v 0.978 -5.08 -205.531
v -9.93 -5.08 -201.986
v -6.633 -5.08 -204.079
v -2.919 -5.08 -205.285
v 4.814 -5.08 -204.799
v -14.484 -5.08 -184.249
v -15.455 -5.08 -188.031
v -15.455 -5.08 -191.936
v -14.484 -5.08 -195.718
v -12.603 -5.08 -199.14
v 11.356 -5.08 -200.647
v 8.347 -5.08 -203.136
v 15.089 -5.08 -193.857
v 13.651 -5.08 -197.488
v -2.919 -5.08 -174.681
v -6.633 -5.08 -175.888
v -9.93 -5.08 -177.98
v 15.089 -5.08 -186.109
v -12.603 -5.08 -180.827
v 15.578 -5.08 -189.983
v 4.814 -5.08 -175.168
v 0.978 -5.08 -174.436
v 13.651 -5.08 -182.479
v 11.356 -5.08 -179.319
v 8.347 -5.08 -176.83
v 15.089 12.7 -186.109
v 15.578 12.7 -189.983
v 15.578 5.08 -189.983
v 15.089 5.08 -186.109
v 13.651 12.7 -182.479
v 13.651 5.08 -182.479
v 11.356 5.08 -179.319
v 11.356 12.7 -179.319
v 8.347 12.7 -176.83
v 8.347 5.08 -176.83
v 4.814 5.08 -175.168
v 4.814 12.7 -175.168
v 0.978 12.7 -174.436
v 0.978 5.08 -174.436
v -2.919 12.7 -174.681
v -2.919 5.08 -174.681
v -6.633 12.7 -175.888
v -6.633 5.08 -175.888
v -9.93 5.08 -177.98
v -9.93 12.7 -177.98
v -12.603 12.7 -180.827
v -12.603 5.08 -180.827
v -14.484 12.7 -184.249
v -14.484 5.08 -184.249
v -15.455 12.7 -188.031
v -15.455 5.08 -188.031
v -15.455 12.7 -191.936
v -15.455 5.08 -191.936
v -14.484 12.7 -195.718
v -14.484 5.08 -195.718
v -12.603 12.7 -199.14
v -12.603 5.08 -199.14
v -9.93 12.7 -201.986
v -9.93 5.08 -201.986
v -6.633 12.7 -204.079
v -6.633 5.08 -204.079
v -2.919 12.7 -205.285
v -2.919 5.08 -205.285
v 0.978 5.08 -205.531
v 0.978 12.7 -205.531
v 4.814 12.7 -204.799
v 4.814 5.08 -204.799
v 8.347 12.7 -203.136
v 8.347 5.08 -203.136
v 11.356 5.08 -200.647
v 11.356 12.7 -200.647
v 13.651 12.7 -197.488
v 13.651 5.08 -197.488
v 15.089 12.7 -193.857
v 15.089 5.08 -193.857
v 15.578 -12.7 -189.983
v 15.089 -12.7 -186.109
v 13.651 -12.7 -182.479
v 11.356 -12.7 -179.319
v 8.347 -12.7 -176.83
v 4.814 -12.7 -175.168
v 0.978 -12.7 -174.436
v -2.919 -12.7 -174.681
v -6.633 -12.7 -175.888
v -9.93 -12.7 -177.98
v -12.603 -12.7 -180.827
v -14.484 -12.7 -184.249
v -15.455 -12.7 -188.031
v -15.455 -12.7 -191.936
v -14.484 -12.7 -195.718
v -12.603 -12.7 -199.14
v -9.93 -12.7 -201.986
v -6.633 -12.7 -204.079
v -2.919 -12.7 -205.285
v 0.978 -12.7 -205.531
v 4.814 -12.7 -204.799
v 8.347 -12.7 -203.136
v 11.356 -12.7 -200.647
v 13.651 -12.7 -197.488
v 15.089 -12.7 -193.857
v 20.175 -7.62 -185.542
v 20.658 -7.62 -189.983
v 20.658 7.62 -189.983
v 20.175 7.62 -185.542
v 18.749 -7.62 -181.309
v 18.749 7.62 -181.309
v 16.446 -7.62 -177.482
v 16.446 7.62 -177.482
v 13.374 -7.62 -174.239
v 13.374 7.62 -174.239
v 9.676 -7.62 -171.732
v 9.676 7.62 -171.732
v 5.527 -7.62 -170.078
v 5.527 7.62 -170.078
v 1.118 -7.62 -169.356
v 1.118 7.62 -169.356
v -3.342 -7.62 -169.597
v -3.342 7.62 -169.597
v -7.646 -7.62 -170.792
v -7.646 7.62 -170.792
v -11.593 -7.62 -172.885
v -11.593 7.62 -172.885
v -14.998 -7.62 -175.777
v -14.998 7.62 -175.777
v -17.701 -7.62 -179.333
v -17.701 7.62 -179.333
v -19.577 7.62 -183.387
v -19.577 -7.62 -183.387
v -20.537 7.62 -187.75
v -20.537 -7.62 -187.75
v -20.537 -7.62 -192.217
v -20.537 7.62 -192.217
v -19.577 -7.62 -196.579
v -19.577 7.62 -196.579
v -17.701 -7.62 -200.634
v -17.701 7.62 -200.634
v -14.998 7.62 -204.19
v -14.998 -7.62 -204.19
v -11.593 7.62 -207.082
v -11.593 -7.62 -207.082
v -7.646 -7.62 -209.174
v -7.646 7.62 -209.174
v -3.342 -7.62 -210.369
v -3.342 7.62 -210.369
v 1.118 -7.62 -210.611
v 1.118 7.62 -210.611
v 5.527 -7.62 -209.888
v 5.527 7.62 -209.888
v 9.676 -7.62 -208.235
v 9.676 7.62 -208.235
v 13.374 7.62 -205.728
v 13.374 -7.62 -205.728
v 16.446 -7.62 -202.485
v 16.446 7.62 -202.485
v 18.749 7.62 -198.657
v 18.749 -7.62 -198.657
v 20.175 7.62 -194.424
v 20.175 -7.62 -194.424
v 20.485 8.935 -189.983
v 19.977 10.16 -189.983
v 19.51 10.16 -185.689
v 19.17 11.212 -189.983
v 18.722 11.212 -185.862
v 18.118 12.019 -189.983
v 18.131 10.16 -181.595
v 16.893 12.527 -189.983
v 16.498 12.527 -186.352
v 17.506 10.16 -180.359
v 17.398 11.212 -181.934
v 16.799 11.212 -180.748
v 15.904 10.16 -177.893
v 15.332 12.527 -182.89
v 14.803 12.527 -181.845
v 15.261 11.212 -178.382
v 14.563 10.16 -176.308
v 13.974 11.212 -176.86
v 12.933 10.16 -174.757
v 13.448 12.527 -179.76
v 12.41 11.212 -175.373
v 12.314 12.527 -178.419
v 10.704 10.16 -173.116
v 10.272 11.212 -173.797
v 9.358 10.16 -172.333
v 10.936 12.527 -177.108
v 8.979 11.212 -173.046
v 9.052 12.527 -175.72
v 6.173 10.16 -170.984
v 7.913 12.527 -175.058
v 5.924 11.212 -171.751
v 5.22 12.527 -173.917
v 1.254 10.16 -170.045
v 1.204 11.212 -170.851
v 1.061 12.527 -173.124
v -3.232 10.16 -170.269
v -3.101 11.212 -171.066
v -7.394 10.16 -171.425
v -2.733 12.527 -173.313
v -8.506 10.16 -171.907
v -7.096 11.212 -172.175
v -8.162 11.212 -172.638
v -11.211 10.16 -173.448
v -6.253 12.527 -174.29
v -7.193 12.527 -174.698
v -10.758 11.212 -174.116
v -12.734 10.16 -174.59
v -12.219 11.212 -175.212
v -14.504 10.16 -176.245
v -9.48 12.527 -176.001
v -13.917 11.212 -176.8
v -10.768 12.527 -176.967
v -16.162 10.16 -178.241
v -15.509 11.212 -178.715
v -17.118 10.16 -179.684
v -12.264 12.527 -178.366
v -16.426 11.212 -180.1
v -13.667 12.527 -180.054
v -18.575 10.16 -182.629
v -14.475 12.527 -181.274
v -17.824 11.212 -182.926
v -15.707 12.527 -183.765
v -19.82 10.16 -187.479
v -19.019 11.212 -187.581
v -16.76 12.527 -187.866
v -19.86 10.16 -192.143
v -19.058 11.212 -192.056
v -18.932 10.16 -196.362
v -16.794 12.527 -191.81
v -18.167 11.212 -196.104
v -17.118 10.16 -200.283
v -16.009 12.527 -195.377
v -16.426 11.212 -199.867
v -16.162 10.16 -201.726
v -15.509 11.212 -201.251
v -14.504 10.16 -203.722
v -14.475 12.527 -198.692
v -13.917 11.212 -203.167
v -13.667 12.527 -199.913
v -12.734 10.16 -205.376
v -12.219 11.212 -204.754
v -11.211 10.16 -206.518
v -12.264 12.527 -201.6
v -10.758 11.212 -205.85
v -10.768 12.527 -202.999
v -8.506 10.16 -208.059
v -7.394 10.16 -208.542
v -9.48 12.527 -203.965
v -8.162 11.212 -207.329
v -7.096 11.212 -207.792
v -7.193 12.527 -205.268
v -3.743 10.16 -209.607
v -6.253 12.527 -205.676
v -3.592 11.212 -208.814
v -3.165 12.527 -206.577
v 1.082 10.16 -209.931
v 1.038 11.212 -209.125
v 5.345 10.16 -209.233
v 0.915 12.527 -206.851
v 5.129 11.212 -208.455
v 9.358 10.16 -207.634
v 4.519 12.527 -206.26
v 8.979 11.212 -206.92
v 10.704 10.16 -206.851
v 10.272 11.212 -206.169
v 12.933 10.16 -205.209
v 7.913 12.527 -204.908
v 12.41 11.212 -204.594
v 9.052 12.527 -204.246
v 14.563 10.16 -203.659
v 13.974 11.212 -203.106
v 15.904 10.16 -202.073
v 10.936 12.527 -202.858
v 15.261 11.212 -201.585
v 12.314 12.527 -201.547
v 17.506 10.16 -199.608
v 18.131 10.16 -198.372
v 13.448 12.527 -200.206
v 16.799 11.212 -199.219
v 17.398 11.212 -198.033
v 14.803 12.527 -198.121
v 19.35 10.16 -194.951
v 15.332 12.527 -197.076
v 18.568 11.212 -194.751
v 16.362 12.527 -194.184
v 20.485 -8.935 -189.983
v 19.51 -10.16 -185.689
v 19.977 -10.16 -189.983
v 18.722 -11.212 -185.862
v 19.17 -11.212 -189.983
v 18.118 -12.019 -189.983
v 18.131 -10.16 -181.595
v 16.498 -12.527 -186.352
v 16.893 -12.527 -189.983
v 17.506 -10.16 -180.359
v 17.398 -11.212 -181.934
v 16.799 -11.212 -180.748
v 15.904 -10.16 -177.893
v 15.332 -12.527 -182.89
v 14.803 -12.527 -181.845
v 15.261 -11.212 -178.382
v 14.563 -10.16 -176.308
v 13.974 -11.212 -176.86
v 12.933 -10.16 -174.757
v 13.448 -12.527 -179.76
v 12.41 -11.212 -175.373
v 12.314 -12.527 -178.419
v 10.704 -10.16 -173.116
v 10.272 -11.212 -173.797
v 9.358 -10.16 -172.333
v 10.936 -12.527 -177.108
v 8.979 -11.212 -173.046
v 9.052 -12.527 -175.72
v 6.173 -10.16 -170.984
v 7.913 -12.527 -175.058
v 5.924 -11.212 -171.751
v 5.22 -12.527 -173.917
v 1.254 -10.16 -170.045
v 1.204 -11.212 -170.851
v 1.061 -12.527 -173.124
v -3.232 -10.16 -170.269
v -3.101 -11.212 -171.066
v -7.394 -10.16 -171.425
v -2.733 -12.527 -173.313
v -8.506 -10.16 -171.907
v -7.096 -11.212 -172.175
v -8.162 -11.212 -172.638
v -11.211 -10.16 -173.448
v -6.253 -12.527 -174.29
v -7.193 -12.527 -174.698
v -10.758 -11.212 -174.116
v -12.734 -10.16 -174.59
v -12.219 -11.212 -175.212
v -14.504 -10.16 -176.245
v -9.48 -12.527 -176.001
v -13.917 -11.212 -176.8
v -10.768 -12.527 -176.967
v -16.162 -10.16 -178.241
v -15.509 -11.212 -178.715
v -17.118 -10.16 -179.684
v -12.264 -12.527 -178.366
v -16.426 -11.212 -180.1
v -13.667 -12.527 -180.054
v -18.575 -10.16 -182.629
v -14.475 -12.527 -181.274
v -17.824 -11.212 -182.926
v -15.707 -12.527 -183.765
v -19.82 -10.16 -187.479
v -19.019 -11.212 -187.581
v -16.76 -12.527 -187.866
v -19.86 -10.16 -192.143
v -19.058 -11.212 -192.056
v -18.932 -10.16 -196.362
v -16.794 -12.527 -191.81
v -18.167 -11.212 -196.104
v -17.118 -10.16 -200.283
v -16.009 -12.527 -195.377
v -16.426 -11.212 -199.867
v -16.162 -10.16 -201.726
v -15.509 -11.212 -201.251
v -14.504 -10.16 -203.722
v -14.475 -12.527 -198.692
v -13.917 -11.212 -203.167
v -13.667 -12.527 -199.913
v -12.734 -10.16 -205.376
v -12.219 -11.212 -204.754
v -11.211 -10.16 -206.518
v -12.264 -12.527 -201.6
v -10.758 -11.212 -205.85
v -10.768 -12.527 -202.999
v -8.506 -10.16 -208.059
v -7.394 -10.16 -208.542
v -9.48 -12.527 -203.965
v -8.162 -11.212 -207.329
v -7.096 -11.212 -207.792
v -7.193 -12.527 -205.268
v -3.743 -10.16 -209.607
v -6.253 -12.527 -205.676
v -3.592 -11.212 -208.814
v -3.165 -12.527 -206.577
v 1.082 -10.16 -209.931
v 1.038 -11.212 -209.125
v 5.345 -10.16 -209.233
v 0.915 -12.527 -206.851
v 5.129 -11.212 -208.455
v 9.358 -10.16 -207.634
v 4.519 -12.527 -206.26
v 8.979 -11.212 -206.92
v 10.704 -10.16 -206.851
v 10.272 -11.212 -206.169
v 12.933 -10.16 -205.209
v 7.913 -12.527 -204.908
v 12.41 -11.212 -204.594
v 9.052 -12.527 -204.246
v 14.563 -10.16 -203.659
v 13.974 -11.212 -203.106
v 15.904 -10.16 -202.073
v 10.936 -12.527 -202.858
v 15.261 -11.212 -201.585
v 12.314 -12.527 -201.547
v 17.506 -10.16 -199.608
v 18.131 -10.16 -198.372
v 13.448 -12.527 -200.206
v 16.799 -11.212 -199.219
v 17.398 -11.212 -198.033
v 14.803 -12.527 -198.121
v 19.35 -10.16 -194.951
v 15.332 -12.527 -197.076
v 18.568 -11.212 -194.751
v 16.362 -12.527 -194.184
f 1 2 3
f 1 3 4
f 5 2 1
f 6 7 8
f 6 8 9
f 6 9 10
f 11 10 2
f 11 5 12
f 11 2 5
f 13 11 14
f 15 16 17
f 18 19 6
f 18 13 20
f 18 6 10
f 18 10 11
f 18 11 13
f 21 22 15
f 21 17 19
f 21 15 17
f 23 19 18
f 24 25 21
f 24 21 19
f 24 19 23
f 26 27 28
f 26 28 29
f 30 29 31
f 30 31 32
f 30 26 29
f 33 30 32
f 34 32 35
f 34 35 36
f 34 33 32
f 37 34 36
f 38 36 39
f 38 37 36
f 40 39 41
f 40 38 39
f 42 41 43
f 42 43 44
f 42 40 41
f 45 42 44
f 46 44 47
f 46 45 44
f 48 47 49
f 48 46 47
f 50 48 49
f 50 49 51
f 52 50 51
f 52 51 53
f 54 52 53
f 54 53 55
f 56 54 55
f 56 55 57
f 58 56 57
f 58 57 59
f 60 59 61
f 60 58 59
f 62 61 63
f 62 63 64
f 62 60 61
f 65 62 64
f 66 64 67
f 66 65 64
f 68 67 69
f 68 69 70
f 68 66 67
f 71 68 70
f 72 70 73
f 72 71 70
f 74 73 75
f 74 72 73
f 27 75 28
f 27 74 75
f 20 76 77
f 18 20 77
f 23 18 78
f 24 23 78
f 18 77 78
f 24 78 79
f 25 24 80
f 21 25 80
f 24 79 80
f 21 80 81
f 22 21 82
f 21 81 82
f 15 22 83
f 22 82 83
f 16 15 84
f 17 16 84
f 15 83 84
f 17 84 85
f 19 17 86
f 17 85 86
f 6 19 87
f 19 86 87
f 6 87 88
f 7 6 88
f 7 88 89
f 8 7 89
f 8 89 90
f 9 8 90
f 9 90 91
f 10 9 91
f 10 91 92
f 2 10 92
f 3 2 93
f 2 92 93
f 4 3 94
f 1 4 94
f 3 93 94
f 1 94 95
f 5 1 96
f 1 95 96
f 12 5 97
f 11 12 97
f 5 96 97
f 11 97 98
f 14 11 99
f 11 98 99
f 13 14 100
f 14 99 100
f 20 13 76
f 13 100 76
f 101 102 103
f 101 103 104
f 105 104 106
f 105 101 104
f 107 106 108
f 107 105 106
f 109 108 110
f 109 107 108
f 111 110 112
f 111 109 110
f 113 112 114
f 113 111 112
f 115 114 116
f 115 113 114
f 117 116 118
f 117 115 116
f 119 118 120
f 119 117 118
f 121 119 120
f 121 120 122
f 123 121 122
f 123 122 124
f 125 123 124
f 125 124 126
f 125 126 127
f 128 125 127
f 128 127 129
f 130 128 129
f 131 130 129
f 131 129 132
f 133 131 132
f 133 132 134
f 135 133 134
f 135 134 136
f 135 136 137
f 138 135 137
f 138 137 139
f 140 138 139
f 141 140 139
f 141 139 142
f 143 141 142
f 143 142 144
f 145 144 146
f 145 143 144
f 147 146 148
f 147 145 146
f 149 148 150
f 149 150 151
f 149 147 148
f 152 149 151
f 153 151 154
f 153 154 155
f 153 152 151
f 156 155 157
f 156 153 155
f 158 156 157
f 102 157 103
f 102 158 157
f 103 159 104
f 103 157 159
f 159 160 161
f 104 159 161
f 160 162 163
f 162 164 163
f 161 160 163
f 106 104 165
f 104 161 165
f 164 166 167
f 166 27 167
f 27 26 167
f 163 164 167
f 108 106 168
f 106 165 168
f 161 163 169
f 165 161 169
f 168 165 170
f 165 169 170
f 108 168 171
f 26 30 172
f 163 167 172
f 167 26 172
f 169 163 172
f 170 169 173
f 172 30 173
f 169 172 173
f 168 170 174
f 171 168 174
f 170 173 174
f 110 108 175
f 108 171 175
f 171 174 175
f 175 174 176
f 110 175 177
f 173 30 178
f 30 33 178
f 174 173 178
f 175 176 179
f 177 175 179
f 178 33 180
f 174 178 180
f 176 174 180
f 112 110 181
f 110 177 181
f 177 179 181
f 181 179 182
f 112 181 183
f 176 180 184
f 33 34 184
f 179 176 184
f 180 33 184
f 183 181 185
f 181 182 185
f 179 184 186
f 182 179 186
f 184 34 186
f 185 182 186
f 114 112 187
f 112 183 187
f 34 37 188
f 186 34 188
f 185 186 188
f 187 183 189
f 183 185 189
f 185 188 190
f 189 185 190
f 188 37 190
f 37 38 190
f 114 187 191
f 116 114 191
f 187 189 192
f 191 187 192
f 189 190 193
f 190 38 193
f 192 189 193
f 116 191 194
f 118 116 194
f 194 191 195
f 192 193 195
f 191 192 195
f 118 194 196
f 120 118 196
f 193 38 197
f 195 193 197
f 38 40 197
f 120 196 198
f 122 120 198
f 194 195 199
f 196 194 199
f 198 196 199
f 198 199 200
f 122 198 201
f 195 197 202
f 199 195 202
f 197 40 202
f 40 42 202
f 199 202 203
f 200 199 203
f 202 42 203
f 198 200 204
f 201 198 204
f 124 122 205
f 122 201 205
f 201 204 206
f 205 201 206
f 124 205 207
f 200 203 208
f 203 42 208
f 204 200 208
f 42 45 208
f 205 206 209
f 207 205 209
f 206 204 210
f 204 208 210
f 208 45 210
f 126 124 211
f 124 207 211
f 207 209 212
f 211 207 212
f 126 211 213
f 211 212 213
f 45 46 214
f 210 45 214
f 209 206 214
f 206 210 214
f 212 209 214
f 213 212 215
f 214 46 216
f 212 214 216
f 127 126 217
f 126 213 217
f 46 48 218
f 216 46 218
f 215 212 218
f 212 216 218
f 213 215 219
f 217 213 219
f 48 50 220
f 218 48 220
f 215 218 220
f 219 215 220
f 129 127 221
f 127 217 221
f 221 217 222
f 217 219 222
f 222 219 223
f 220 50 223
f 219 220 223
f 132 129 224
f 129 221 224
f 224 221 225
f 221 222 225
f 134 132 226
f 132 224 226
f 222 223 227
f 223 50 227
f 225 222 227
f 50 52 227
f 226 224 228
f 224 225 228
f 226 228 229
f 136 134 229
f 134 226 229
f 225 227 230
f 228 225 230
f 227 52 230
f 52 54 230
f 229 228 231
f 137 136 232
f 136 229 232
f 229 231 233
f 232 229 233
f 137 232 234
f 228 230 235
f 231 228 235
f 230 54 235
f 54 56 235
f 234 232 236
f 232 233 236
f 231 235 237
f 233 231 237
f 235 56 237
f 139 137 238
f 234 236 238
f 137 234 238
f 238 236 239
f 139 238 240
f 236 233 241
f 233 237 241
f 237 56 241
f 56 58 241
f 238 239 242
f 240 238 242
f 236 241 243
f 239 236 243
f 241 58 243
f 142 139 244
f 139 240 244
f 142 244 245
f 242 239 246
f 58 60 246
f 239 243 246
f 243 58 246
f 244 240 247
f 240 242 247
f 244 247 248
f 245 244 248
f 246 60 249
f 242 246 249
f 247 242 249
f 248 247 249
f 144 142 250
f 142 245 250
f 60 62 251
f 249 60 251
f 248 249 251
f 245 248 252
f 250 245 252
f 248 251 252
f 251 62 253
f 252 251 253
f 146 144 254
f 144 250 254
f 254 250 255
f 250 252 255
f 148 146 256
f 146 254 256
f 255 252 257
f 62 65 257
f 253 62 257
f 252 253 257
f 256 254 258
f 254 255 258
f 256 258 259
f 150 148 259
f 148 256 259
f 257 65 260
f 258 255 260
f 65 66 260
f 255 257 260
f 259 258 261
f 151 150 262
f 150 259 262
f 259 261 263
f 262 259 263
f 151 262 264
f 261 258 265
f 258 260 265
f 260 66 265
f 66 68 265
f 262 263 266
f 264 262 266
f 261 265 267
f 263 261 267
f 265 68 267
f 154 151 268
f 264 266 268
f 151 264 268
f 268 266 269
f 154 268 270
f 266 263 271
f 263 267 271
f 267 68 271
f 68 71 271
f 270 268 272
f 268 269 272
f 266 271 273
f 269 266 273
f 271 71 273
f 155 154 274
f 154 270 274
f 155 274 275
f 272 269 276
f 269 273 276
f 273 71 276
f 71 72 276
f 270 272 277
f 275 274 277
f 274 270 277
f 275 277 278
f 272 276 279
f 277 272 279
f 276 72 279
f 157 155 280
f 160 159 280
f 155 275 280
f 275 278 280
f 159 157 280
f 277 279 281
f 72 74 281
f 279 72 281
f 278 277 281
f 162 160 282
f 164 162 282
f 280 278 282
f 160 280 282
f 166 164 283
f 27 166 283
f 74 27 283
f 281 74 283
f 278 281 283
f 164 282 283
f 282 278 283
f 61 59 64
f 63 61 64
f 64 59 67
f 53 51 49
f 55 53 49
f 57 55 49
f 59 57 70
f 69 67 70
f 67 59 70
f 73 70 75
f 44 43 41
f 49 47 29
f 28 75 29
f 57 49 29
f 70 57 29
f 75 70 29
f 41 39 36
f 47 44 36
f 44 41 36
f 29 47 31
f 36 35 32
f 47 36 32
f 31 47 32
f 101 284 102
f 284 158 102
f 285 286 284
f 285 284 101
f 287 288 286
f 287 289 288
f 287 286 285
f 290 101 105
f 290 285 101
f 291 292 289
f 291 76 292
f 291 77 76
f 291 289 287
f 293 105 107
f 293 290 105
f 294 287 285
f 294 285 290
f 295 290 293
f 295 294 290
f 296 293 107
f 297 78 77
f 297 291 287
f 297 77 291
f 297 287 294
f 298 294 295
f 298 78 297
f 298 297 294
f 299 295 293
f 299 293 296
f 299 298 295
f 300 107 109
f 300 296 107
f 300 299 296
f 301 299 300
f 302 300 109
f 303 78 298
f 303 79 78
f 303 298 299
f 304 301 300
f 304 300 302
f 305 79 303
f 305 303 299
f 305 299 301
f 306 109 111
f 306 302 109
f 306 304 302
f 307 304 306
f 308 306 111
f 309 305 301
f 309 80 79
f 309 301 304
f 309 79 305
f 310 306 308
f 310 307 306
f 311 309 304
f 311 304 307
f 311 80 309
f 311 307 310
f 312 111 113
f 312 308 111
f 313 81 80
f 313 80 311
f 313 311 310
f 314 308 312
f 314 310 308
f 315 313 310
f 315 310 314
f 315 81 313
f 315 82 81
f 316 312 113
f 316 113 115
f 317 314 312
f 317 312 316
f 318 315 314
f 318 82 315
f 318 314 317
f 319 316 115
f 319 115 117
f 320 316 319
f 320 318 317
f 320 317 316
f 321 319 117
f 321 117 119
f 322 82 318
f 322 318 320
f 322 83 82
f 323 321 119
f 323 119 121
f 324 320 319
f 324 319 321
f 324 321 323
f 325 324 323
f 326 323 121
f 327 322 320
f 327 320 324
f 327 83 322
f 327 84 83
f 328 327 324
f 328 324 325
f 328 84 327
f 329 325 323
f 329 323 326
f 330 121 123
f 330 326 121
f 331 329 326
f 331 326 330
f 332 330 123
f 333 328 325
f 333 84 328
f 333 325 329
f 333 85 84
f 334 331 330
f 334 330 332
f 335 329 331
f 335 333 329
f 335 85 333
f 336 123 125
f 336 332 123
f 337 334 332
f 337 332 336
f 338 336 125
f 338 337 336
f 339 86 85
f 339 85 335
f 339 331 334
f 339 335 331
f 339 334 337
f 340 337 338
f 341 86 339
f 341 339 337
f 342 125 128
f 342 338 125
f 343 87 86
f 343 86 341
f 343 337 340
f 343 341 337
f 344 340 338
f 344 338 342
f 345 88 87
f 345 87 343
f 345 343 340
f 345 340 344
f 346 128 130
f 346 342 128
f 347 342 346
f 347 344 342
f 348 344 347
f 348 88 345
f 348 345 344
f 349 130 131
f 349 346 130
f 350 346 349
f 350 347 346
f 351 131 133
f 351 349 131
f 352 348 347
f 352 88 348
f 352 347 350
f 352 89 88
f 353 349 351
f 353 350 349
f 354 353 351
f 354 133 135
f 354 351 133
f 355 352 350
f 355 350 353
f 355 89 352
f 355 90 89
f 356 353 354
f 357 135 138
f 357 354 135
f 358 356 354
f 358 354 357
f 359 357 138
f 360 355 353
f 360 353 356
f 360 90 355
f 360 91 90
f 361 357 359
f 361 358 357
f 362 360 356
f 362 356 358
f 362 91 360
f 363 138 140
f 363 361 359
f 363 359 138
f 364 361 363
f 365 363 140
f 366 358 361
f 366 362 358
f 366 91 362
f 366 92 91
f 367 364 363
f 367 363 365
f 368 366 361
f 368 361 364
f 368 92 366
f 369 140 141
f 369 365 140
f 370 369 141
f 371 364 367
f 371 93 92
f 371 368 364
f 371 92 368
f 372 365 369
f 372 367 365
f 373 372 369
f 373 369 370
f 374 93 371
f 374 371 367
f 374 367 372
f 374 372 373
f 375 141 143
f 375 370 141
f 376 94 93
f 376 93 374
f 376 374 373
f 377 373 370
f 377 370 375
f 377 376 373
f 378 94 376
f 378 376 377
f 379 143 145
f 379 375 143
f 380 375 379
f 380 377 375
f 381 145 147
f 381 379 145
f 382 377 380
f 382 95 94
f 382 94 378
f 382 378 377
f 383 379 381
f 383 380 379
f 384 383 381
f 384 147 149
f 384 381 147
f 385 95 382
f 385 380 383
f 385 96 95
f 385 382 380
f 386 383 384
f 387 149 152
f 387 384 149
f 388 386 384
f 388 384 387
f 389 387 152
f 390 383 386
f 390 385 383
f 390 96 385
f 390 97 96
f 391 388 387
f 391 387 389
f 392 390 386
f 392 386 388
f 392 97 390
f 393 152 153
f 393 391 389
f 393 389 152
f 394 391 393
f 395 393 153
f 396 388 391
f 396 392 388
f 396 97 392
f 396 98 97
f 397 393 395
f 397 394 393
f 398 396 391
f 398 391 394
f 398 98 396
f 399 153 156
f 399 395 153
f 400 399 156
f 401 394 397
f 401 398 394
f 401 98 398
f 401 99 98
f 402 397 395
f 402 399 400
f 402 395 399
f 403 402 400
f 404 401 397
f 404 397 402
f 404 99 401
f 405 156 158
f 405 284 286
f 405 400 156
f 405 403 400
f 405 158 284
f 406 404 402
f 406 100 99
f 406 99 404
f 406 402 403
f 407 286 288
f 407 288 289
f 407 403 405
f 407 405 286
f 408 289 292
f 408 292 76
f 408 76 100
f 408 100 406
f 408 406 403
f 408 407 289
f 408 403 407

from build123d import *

# Parameters (mm, degrees)
F4_R     = 20.6580157973
F5_DEPTH = 12.7
F6_DEPTH = 12.7
F7_R     = 5.08
F8_DEPTH = 7.62
F9_DEPTH = 7.62


# Not quite as in the source:
# - a feature of the source that left no trace in its solid (it failed there, or was rolled back) is left out


with BuildPart() as f5:
    # F4 (on Front) → F5 (new body)
    with BuildSketch(Plane.XZ):
        with Locations((0, -189.9833083153)):
            Circle(F4_R)
    extrude(amount=F5_DEPTH)

    # F6 (add): a face of the model
    f6_faces = [f5.faces().sort_by_distance(p)[0] for p in [
        (0, 0, -189.9833083153),
    ]]
    extrude(f6_faces, amount=F6_DEPTH)

    # F7
    f7_edges = [f5.edges().sort_by_distance(p)[0] for p in [
        (-20.658016, -12.7, -189.983308),
        (-20.658016, 12.7, -189.983308),
    ]]
    fillet(f7_edges, radius=F7_R)

    # F8 (cut): a face of the model
    f8_faces = [f5.faces().sort_by_distance(p)[0] for p in [
        (0, -12.7, -189.9833083153),
    ]]
    extrude(f8_faces, amount=-F8_DEPTH, mode=Mode.SUBTRACT)

    # F9 (cut): a face of the model
    f9_faces = [f5.faces().sort_by_distance(p)[0] for p in [
        (0, 12.7, -189.9833083153),
    ]]
    extrude(f9_faces, amount=-F9_DEPTH, mode=Mode.SUBTRACT)


solid = f5.part
